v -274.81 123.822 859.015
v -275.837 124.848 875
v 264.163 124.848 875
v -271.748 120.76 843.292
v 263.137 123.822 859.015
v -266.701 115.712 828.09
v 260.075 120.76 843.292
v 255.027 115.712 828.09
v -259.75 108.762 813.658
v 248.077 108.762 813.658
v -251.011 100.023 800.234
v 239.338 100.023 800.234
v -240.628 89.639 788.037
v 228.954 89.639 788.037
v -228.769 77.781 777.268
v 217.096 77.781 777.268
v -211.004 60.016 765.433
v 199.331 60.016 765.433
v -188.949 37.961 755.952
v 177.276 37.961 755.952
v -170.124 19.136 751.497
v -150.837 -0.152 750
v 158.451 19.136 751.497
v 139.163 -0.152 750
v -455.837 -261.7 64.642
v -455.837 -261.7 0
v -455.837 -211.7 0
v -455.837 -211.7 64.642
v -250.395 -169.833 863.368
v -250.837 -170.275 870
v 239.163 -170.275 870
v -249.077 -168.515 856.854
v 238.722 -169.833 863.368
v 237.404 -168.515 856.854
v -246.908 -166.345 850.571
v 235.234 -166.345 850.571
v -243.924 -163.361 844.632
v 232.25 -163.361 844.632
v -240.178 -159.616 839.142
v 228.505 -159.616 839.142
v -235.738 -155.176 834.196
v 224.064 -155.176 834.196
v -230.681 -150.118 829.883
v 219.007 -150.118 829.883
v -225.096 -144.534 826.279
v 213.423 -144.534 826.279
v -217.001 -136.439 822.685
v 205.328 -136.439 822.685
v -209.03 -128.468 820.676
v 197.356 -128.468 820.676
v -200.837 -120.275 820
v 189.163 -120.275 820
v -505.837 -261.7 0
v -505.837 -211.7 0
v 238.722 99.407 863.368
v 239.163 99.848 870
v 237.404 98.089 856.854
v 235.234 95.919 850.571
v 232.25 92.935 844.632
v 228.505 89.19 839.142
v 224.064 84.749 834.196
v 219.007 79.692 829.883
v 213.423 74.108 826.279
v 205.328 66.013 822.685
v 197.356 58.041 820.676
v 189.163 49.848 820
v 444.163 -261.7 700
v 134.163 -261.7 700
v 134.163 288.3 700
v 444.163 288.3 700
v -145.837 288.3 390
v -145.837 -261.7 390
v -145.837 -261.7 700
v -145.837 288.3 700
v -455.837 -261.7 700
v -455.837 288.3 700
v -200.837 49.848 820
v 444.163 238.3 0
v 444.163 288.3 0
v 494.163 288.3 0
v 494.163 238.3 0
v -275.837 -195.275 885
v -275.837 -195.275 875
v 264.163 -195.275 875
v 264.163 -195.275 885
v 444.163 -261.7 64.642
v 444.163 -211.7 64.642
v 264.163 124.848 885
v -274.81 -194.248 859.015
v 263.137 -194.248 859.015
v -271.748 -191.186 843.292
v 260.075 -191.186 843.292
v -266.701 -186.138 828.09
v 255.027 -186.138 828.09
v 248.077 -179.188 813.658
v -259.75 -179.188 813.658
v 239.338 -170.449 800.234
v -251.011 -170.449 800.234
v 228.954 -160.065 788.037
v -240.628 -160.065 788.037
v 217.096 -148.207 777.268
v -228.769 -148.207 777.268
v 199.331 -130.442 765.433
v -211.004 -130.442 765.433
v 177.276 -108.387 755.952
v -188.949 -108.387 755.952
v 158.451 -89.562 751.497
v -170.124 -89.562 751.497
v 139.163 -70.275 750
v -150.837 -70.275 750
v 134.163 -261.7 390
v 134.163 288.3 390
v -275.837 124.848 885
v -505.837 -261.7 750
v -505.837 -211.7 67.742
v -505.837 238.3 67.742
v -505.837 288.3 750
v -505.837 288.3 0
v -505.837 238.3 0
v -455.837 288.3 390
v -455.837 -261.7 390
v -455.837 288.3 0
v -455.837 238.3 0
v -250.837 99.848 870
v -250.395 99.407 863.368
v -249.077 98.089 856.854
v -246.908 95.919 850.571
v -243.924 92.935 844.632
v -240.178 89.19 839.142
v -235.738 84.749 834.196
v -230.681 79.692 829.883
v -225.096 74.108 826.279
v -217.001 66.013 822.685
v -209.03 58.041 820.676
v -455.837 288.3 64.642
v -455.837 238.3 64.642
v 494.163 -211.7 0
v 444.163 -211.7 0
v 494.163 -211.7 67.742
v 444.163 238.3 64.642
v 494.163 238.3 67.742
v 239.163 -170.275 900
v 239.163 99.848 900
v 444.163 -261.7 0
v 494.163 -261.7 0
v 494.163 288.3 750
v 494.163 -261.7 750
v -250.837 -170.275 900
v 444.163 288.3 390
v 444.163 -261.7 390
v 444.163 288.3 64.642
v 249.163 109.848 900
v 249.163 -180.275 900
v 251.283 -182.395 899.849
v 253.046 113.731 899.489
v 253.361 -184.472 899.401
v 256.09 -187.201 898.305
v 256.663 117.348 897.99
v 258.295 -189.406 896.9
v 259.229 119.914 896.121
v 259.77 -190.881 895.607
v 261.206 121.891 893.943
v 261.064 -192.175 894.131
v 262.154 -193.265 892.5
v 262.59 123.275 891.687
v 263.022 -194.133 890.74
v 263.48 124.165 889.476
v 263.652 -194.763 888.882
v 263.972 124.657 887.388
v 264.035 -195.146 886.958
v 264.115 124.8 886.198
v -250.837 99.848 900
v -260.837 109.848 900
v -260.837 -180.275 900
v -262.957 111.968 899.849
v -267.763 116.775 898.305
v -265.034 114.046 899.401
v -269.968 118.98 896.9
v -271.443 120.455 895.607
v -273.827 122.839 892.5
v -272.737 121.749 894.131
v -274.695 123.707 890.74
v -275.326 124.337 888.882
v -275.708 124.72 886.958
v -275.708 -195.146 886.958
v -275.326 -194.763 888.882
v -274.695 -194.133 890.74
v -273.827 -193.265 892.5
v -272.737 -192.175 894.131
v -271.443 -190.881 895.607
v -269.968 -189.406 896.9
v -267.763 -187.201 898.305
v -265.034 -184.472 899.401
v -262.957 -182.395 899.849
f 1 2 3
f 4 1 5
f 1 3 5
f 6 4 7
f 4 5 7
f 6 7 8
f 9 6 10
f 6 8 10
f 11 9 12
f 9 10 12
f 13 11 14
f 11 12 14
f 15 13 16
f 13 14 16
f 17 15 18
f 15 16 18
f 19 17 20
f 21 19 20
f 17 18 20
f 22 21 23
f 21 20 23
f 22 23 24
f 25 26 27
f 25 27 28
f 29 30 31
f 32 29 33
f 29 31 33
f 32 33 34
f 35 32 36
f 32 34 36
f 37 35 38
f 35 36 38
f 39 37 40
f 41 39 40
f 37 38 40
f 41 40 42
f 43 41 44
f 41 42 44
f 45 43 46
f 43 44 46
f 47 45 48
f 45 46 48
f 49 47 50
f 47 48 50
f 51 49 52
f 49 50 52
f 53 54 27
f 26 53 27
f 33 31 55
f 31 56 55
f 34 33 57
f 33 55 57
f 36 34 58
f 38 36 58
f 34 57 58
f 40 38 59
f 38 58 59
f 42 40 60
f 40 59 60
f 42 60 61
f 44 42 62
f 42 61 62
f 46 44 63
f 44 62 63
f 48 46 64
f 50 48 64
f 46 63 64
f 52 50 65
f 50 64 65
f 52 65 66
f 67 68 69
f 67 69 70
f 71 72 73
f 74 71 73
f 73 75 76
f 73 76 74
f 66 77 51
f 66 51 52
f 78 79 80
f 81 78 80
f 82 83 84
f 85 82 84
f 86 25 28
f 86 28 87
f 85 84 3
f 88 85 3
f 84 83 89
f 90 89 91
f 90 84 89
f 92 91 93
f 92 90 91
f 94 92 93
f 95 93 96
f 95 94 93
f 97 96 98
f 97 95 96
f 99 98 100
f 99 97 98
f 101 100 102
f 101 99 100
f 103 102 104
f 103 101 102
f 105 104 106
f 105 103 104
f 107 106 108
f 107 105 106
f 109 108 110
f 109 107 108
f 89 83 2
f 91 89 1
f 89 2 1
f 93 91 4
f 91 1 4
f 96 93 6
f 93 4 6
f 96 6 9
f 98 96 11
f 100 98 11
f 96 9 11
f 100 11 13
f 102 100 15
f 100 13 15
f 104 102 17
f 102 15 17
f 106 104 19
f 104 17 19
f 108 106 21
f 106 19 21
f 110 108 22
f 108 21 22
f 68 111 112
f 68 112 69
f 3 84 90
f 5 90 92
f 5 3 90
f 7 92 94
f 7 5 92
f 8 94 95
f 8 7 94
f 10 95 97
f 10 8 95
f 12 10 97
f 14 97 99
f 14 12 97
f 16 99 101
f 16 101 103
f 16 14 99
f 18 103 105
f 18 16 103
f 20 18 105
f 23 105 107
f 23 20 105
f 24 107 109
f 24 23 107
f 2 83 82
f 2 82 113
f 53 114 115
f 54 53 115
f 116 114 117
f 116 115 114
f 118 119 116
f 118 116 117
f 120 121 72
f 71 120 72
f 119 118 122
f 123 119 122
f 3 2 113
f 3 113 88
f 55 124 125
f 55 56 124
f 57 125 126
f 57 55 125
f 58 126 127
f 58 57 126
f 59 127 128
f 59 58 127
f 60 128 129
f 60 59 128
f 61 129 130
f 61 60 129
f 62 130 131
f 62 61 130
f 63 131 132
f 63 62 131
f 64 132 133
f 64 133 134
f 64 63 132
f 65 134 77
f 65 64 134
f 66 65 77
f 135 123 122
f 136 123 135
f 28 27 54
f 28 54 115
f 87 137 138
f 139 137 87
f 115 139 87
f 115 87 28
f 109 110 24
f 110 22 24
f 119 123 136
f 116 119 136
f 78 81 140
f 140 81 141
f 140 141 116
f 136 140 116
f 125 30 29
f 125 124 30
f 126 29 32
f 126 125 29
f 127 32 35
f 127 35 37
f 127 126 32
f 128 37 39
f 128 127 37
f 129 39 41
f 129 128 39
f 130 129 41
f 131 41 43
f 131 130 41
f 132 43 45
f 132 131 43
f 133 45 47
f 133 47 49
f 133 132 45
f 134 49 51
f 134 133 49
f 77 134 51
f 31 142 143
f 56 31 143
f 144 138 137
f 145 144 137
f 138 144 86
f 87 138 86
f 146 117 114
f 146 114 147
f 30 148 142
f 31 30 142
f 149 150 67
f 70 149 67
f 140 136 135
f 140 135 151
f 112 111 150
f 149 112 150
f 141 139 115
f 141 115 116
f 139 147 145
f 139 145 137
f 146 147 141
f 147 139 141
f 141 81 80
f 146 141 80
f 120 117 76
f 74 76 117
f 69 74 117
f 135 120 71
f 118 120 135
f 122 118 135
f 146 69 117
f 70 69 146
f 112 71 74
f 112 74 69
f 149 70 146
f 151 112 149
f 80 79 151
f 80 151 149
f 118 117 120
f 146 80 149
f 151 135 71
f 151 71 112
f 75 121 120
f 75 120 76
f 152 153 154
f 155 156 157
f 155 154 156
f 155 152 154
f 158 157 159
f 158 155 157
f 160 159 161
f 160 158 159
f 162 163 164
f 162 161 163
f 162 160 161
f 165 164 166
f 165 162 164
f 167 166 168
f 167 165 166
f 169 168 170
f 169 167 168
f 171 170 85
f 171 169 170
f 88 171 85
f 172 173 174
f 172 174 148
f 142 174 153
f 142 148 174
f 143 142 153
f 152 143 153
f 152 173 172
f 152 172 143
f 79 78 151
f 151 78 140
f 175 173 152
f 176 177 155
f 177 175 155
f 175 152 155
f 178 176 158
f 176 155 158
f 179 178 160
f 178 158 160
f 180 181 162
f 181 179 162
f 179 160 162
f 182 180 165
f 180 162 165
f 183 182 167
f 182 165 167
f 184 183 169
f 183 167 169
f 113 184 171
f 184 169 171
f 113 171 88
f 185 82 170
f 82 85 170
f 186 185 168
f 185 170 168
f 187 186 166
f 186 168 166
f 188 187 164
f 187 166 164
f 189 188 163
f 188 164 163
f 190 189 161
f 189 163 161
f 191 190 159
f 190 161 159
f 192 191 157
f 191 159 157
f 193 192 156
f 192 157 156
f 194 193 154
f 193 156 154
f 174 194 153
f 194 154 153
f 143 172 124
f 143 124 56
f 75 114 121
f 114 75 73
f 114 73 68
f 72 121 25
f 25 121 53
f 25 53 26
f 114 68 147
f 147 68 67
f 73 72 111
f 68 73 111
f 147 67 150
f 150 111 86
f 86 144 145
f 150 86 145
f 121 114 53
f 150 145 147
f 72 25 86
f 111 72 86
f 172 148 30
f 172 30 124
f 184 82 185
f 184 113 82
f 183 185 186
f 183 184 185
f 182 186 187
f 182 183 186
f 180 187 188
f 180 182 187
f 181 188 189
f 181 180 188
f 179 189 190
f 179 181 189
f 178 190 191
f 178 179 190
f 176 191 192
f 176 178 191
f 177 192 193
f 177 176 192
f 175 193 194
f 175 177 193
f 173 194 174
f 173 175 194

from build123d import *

# Parameters (mm, degrees)
F0_W      = 1000
F0_H      = 550
F1_DEPTH  = 750
F3_W      = 540
F3_H      = 320.122876247
F4_DEPTH  = 150
F5_R      = 125
F6_R      = 15
F7_W      = 490
F7_H      = 270.122876247
F8_DEPTH  = 80
F9_R      = 50
F10_W     = 310
F10_H     = 310
F10_W_2   = 900
F10_H_2   = 64.6422952414
F11_DEPTH = 550
F12_W     = 450
F12_H     = 67.7417116343
F13_DEPTH = 1000.001


with BuildPart() as f1:
    # F0 (on Top) → F1 (new body)
    with BuildSketch(Plane.XY):
        with Locations((-5.8366749436, 13.2999491933)):
            Rectangle(F0_W, F0_H)
    extrude(amount=F1_DEPTH)

    # F10 (on face) → F11 (cut, through all)
    with BuildSketch(Plane.XZ.offset(261.7000508067)):
        with Locations((-300.8366749436, 545)):
            Rectangle(F10_W, F10_H)
        with Locations((289.1633250564, 545)):
            Rectangle(F10_W, F10_H)
        with Locations((-5.8366749436, 32.3211476207)):
            Rectangle(F10_W_2, F10_H_2)
    extrude(amount=-F11_DEPTH, mode=Mode.SUBTRACT)

    # F12 (on face) → F13 (cut, through all)
    with BuildSketch(Plane.YZ.offset(494.1633250564)):
        with Locations((13.2999491933, 33.8708558172)):
            Rectangle(F12_W, F12_H)
    extrude(amount=-F13_DEPTH, mode=Mode.SUBTRACT)


with BuildPart() as f4:
    # F3 (on offset) → F4 (new body)
    with BuildSketch(Plane.XY.offset(750)):
        with Locations((-5.8366749436, -35.2130914107)):
            Rectangle(F3_W, F3_H)
    extrude(amount=F4_DEPTH)

    # F5
    f5_edges = [f4.edges().sort_by_distance(p)[0] for p in [
        (-5.836675, -195.27453, 750),
        (264.163325, -35.213091, 750),
        (-5.836675, 124.848347, 750),
        (-275.836675, -35.213091, 750),
    ]]
    fillet(f5_edges, radius=F5_R)

    # F6
    f6_edges = [f4.edges().sort_by_distance(p)[0] for p in [
        (-5.836675, -195.27453, 900),
        (-275.836675, -35.213091, 900),
        (-5.836675, 124.848347, 900),
        (264.163325, -35.213091, 900),
    ]]
    fillet(f6_edges, radius=F6_R)

    # F7 (on face) → F8 (cut)
    with BuildSketch(Plane.XY.offset(900)):
        with Locations((-5.8366749436, -35.2130914107)):
            Rectangle(F7_W, F7_H)
    extrude(amount=-F8_DEPTH, mode=Mode.SUBTRACT)

    # F9
    f9_edges = [f4.edges().sort_by_distance(p)[0] for p in [
        (-5.836675, 99.848347, 820),
        (-250.836675, -35.213091, 820),
        (239.163325, -35.213091, 820),
        (-5.836675, -170.27453, 820),
    ]]
    fillet(f9_edges, radius=F9_R)


solid = Compound([f1.part, f4.part])
